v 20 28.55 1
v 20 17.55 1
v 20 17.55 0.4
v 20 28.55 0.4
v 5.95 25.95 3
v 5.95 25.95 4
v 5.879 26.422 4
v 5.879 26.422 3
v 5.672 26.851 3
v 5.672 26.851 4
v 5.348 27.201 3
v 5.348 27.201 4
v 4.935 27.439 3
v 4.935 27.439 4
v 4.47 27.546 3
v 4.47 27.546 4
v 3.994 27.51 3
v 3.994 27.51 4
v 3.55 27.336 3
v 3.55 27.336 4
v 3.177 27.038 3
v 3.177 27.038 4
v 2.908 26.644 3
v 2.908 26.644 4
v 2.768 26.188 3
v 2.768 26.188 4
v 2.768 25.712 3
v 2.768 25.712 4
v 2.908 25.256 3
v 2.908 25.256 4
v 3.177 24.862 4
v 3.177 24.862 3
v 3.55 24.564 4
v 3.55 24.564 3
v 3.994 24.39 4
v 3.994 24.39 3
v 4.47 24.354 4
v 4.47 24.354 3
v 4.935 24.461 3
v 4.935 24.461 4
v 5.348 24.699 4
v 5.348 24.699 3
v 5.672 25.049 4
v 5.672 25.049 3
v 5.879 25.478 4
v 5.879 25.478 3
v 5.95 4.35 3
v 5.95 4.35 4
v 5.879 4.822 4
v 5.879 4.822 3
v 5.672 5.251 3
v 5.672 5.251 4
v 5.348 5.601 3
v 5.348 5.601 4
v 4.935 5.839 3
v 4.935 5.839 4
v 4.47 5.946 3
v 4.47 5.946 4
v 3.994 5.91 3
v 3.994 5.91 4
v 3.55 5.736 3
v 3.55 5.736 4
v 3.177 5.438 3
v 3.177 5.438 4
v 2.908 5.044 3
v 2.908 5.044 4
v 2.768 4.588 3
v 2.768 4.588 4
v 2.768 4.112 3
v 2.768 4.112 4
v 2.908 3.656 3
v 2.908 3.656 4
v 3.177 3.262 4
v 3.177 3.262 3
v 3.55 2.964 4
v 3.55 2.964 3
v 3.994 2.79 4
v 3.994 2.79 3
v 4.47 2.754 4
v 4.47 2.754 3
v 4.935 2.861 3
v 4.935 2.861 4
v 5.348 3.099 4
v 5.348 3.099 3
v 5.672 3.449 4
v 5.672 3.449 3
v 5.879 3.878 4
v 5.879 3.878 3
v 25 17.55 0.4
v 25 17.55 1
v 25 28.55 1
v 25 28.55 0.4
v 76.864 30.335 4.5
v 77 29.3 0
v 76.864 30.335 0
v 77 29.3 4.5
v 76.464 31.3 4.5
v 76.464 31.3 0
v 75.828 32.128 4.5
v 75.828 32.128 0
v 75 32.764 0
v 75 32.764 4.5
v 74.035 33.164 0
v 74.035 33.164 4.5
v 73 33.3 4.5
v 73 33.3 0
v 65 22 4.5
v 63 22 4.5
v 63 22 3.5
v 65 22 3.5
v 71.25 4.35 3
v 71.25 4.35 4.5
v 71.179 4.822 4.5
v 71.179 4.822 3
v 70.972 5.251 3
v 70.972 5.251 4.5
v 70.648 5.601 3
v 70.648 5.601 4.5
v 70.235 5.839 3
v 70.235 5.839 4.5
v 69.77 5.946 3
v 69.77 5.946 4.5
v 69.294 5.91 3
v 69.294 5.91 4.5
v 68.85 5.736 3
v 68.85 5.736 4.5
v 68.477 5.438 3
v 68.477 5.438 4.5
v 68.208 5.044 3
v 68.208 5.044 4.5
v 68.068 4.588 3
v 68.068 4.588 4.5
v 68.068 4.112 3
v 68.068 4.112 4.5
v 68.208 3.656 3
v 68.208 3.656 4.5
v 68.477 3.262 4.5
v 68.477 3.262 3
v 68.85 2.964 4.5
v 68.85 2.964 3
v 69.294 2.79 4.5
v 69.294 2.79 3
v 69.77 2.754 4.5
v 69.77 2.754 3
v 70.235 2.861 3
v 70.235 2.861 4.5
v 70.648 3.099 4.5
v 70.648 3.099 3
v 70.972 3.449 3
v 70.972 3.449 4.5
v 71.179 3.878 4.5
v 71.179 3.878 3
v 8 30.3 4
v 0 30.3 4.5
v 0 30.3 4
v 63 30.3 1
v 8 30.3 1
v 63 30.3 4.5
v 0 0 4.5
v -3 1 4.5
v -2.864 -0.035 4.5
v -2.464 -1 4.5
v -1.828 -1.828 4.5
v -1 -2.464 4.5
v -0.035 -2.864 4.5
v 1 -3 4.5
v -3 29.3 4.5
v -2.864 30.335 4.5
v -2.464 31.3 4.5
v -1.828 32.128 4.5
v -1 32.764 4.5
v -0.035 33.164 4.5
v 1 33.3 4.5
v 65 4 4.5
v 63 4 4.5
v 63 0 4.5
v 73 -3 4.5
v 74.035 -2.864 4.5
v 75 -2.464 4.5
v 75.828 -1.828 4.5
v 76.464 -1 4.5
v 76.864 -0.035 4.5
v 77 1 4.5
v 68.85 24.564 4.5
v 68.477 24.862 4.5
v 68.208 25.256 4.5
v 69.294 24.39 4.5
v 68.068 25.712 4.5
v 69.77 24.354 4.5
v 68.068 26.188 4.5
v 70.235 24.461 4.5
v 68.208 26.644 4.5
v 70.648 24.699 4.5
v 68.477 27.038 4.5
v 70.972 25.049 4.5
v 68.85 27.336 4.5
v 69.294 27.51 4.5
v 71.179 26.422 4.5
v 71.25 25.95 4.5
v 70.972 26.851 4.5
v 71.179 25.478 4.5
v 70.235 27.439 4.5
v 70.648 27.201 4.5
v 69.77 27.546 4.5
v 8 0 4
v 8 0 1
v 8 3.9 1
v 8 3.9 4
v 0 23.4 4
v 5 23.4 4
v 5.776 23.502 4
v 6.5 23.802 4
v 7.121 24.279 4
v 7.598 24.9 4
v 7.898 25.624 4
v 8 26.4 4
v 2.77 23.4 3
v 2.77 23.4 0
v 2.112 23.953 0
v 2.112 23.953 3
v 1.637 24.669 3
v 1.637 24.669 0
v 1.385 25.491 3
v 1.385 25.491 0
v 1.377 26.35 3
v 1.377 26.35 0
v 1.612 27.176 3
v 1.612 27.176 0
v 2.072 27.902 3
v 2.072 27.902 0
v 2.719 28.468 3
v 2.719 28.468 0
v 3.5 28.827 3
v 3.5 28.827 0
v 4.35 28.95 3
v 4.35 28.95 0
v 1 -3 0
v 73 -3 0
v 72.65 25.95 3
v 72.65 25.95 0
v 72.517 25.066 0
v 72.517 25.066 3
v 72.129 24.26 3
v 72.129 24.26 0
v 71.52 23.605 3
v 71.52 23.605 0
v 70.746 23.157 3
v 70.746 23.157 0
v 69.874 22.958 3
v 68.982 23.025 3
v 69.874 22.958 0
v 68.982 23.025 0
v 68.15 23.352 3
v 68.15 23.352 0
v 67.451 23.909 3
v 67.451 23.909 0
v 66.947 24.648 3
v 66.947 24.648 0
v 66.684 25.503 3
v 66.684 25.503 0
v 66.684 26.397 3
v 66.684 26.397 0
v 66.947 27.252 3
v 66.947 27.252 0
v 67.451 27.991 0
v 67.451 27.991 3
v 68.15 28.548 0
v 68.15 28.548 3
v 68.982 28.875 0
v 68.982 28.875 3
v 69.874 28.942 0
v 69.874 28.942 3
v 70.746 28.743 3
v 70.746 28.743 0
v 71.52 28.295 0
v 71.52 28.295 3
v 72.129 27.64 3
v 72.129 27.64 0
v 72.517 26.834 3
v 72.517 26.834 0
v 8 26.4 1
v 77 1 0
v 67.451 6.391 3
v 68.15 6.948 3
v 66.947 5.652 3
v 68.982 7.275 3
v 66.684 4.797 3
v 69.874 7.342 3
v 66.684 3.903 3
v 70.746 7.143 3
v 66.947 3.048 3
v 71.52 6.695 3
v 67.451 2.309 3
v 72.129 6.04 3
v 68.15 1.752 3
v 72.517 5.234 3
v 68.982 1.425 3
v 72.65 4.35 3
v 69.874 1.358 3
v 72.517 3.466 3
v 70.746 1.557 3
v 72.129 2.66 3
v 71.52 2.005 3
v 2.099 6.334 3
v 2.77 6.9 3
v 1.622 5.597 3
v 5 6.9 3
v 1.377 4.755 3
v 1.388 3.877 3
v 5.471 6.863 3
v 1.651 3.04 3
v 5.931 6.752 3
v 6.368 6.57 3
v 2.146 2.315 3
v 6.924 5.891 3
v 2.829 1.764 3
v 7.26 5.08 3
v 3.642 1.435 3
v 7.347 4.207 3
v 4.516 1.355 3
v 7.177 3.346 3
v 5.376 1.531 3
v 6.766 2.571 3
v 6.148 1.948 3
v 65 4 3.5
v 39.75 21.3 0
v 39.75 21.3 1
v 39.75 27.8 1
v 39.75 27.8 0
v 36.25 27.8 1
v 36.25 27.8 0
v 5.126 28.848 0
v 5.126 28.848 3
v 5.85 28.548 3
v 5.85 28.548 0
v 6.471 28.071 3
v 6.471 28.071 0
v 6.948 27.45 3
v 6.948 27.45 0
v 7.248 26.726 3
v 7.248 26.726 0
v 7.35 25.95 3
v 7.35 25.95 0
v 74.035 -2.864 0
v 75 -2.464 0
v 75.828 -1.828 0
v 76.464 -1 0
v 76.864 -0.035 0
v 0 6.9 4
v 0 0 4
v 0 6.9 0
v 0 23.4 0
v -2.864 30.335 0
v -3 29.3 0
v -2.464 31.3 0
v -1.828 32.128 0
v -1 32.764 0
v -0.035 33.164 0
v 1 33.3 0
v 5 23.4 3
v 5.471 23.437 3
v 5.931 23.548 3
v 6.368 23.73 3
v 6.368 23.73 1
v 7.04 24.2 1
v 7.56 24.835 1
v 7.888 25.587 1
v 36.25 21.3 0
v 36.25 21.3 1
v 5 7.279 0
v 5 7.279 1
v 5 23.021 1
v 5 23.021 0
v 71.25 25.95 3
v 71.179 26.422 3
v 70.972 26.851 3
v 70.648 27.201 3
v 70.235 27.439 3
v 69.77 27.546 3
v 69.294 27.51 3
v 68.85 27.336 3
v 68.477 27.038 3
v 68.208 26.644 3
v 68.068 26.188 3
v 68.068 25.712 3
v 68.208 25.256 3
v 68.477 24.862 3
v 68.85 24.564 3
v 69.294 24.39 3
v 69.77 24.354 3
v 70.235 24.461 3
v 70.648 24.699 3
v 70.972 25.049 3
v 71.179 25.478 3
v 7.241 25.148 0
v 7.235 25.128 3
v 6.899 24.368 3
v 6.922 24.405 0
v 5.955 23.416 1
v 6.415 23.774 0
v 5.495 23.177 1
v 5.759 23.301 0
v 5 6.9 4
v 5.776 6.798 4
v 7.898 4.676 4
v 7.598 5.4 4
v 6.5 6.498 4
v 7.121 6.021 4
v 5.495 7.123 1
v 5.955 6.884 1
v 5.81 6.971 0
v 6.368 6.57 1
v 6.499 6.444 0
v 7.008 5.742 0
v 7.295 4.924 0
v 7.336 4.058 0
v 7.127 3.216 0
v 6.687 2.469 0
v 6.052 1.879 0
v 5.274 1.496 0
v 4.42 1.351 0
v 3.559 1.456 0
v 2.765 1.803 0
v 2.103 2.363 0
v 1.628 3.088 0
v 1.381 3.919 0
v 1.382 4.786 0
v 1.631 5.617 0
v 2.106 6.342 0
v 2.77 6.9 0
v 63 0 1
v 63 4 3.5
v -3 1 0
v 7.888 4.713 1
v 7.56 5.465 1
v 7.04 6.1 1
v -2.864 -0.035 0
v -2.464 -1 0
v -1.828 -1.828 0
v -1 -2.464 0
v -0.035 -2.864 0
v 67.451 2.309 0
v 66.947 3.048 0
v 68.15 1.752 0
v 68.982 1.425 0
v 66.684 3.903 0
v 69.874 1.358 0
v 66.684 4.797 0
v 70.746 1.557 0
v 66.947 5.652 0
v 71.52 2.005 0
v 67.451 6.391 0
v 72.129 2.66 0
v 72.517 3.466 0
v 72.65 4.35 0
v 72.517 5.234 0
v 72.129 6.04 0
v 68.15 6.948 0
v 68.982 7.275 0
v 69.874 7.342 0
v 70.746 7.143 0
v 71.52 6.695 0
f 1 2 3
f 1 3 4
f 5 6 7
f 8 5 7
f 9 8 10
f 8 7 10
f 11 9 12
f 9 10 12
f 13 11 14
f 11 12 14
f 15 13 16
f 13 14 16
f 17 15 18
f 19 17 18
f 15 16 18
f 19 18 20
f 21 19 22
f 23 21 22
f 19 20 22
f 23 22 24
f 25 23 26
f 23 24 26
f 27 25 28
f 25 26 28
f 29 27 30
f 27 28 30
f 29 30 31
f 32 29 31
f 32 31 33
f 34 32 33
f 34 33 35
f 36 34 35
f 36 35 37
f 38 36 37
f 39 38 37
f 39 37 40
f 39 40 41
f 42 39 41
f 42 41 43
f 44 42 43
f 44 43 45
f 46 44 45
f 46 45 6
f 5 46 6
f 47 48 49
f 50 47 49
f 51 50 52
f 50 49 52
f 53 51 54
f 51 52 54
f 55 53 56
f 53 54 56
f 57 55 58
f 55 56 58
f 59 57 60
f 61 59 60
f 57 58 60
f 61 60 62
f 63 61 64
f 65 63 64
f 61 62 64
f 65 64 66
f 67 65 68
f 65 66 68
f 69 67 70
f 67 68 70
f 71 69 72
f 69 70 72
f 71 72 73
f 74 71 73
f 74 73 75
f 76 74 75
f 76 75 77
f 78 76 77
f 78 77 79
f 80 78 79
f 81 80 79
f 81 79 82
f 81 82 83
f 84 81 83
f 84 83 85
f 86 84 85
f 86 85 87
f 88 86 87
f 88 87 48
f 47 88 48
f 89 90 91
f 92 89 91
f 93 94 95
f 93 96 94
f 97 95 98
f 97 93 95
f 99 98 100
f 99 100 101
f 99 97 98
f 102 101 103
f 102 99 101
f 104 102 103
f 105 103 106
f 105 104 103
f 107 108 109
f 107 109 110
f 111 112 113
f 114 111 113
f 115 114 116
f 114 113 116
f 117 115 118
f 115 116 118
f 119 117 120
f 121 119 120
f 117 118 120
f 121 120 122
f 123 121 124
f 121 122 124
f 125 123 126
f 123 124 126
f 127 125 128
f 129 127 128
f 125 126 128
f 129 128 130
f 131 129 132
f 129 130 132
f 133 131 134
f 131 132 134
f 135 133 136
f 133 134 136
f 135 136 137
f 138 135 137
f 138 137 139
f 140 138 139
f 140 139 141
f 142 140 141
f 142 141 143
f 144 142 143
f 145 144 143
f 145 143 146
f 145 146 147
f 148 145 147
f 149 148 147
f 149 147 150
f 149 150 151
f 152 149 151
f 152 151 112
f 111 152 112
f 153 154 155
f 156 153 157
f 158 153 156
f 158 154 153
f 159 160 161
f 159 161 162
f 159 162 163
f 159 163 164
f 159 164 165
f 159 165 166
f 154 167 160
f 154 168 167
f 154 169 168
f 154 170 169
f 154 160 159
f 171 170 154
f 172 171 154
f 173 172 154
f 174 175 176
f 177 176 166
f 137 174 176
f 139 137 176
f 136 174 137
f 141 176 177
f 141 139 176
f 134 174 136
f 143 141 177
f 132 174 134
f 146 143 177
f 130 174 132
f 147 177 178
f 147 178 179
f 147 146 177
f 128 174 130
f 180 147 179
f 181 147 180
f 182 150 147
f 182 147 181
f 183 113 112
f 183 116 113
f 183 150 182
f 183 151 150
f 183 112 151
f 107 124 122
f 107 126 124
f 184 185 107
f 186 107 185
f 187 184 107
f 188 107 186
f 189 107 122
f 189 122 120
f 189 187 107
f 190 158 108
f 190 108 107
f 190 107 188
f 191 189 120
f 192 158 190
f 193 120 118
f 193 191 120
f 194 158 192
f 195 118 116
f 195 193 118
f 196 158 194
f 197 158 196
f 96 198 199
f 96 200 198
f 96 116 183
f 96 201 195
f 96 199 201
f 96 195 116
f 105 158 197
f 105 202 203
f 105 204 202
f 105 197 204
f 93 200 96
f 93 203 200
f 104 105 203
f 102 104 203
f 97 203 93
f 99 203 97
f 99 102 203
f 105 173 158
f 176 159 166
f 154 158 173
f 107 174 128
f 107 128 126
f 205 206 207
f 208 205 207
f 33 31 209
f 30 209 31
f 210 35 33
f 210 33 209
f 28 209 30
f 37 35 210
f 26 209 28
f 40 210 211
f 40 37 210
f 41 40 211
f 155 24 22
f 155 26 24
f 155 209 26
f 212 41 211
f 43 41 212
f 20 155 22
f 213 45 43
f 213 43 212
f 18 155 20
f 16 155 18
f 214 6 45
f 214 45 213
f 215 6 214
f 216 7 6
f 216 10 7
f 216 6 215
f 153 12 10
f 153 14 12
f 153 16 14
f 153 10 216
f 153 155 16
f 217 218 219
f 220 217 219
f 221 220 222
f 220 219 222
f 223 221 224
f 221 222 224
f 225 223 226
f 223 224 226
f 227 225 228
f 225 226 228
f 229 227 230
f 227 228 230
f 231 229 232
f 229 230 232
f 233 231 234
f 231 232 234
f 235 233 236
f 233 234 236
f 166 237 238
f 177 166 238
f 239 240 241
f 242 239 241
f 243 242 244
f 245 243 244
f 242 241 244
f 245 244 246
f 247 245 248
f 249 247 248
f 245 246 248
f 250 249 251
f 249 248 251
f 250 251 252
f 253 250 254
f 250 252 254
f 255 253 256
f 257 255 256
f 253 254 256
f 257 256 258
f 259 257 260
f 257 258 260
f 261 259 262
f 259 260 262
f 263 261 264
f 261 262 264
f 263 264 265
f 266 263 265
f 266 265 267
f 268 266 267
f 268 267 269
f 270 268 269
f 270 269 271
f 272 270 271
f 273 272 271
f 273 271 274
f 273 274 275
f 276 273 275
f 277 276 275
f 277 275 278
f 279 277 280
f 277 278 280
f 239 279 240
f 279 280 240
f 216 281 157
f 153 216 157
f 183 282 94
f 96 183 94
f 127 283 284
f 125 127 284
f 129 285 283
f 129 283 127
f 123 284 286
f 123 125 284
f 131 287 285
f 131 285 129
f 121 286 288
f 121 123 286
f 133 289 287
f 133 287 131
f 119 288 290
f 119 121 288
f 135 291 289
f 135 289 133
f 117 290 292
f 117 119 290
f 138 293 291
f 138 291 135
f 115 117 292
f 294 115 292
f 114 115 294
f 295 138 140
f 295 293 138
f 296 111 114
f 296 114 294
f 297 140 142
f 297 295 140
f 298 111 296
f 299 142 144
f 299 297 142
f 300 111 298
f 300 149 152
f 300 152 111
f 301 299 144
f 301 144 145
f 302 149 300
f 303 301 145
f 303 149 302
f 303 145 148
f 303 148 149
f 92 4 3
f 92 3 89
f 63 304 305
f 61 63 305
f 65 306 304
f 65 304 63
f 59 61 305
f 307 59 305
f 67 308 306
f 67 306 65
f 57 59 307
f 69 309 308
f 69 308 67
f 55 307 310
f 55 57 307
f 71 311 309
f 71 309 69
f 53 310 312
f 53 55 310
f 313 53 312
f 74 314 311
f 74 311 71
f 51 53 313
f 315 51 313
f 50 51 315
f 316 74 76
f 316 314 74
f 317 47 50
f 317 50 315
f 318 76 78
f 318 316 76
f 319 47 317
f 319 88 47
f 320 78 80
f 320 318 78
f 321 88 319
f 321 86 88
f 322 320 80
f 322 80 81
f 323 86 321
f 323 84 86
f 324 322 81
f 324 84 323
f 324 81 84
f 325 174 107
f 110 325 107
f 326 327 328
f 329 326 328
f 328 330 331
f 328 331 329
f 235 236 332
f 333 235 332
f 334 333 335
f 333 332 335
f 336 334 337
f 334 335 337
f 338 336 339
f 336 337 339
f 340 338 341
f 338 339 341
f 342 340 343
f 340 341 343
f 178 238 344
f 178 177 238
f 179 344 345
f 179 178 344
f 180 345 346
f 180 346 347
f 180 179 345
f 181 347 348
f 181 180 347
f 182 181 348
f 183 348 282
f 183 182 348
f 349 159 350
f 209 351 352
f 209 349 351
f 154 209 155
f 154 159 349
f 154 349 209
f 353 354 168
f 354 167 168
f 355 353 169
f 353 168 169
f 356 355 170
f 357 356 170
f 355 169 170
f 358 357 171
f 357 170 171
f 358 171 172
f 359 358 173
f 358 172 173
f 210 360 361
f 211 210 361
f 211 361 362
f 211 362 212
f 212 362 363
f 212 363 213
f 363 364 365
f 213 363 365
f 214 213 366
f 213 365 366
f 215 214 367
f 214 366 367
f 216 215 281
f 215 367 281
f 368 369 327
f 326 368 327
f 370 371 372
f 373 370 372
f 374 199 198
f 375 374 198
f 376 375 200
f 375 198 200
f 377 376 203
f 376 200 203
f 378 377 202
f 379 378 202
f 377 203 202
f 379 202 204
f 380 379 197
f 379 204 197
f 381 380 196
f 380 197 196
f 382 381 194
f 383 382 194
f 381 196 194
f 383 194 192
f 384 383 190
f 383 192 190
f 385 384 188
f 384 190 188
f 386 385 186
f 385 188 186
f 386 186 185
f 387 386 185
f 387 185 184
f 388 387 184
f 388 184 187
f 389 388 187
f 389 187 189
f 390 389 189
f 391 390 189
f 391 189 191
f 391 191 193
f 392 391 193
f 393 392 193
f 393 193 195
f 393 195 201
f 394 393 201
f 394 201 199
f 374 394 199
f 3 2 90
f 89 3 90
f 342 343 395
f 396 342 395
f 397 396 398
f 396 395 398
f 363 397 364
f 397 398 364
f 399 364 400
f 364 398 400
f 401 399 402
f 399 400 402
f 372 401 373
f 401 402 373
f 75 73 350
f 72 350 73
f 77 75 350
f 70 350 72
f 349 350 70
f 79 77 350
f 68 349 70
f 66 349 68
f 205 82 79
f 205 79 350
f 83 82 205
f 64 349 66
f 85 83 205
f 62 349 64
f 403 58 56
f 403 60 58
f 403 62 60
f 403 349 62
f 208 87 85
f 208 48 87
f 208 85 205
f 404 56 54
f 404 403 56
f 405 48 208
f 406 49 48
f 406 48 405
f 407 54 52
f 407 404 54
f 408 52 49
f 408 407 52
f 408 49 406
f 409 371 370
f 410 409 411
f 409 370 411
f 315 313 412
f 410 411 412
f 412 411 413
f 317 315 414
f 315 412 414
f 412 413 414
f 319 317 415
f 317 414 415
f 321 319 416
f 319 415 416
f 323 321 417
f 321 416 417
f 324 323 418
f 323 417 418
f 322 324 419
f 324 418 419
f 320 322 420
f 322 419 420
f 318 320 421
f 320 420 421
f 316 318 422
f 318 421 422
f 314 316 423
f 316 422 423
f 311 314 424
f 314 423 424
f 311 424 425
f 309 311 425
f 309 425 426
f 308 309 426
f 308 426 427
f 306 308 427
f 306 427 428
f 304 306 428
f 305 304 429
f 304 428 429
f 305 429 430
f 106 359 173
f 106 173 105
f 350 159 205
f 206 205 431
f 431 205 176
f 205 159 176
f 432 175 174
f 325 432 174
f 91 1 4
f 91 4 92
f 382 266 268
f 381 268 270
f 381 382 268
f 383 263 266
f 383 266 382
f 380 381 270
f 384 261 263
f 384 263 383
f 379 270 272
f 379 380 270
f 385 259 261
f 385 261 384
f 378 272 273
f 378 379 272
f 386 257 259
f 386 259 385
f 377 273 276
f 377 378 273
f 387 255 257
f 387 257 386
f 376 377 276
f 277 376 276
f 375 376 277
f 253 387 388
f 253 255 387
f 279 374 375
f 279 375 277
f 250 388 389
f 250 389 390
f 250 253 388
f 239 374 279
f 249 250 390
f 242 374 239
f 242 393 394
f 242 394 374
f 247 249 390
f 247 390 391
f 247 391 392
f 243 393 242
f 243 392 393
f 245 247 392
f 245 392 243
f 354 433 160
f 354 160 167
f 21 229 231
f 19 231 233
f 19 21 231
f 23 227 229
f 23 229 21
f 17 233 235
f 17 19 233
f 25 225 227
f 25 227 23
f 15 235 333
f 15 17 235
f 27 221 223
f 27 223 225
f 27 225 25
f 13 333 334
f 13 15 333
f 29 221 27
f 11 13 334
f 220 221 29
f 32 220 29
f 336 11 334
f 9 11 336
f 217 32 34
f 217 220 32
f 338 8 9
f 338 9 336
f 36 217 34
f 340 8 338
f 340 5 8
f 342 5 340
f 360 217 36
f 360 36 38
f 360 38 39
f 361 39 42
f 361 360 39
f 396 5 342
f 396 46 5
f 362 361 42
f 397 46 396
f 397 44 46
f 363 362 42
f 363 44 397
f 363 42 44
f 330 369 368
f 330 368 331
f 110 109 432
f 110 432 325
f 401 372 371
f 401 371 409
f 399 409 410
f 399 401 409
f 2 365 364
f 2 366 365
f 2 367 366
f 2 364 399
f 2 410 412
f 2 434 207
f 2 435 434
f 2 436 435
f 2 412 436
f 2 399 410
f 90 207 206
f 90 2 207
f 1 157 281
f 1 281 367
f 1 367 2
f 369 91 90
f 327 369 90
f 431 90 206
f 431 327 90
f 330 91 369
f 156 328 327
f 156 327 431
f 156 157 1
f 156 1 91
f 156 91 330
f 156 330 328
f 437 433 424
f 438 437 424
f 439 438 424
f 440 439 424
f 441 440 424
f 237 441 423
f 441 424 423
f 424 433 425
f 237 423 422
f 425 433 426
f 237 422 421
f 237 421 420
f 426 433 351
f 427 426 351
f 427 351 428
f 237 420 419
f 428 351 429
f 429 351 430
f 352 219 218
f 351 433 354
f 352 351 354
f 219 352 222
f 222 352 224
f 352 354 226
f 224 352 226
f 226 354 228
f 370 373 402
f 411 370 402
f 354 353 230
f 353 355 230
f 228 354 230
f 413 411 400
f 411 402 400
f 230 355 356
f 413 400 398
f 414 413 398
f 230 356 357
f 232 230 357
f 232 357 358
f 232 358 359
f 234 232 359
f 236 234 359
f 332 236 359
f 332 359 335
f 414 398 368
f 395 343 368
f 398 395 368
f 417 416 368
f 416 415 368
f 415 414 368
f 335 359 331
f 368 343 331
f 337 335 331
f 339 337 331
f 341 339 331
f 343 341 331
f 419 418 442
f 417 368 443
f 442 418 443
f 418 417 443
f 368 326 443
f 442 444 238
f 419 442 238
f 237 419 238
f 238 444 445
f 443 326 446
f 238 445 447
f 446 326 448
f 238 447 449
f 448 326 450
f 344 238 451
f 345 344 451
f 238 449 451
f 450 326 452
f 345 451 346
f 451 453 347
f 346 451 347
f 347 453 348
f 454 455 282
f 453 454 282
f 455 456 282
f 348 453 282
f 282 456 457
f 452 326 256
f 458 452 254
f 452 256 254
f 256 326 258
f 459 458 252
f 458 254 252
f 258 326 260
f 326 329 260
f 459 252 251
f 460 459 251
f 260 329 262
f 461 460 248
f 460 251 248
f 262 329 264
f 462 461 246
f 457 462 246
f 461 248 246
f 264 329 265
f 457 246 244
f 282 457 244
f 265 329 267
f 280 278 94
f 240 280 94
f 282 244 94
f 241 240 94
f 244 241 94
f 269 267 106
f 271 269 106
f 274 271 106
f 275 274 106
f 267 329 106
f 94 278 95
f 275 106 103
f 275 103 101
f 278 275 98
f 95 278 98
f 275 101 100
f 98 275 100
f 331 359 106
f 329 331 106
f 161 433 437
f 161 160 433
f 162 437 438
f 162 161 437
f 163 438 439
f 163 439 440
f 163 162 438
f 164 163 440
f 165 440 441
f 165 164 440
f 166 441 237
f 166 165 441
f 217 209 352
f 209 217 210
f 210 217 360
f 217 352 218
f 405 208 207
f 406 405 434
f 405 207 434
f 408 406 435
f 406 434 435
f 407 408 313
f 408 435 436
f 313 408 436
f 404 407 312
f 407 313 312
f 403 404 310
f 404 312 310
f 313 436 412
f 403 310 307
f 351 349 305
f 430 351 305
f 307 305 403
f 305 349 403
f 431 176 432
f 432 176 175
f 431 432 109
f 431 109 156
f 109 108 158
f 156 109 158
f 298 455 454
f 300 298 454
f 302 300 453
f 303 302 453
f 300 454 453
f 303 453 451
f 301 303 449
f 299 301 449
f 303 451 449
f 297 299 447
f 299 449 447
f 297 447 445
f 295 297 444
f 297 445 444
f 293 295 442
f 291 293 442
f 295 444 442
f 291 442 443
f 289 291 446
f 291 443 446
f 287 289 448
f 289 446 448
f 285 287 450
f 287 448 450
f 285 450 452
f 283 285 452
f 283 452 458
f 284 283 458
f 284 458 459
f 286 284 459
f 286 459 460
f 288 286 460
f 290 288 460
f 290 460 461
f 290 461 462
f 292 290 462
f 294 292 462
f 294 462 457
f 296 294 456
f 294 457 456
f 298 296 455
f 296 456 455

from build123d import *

# Parameters (mm, degrees)
F0_W      = 80
F0_H      = 36.3
F1_DEPTH  = 4.5
F2_R      = 4
F3_W      = 63
F3_H      = 30.3
F4_DEPTH  = 3.5
F5_W      = 5
F5_H      = 16.5
F5_W_2    = 3.5
F5_H_2    = 6.5
F6_DEPTH  = 4.501
F7_W      = 2
F7_H      = 18
F8_DEPTH  = 1
F10_DEPTH = 3
F11_R     = 1.6
F12_DEPTH = 4.501
F13_R     = 3
F14_DEPTH = 3
F15_W     = 5
F15_H     = 11
F16_DEPTH = 0.6


with BuildPart() as f1:
    # F0 (on Top) → F1 (new body)
    with BuildSketch(Plane.XY):
        with Locations((37, 15.15)):
            Rectangle(F0_W, F0_H)
    extrude(amount=F1_DEPTH)

    # F2
    f2_edges = [f1.edges().sort_by_distance(p)[0] for p in [
        (-3, -3, 2.25),
        (77, -3, 2.25),
        (77, 33.3, 2.25),
        (-3, 33.3, 2.25),
    ]]
    fillet(f2_edges, radius=F2_R)

    # F3 (on face) → F4 (cut)
    with BuildSketch(Plane.XY.offset(4.5)):
        with Locations((31.5, 15.15)):
            Rectangle(F3_W, F3_H)
    extrude(amount=-F4_DEPTH, mode=Mode.SUBTRACT)

    # F5 (on face) → F6 (cut, through all)
    with BuildSketch(Plane.XY.offset(4.5)):
        with Locations((2.5, 15.15)):
            Rectangle(F5_W, F5_H)
        with Locations((38, 24.55)):
            Rectangle(F5_W_2, F5_H_2)
    extrude(amount=-F6_DEPTH, mode=Mode.SUBTRACT)

    # F7 (on face) → F8 (cut)
    with BuildSketch(Plane.XY.offset(4.5)):
        with Locations((64, 13)):
            Rectangle(F7_W, F7_H)
    extrude(amount=-F8_DEPTH, mode=Mode.SUBTRACT)

    # F9 (on face) → F10 (join)
    with BuildSketch(Plane.XY.offset(1)):
        with BuildLine():
            Line((8, 30.3), (0, 30.3))
            Line((0, 30.3), (0, 23.4))
            Line((0, 23.4), (5, 23.4))
            ThreePointArc((5, 23.4), (7.12132, 24.27868), (8, 26.4))
            Line((8, 26.4), (8, 30.3))
        make_face()
        with BuildLine():
            Line((5, 6.9), (0, 6.9))
            Line((0, 6.9), (0, 0))
            Line((0, 0), (8, 0))
            Line((8, 0), (8, 3.9))
            ThreePointArc((8, 3.9), (7.12132, 6.02132), (5, 6.9))
        make_face()
    extrude(amount=F10_DEPTH)

    # F11 (on face) → F12 (cut, through all)
    with BuildSketch(Plane.XY.offset(4.5)):
        with Locations((4.35, 4.35)):
            Circle(F11_R)
        with Locations((4.35, 25.95)):
            Circle(F11_R)
        with Locations((69.65, 25.95)):
            Circle(F11_R)
        with Locations((69.65, 4.35)):
            Circle(F11_R)
    extrude(amount=-F12_DEPTH, mode=Mode.SUBTRACT)

    # F13 (on face) → F14 (cut)
    with BuildSketch(Plane(origin=(0, 0, 0), x_dir=(1, 0, 0), z_dir=(0, 0, -1))):
        with Locations((69.65, -25.95)):
            Circle(F13_R)
        with Locations((69.65, -4.35)):
            Circle(F13_R)
        with BuildLine():
            ThreePointArc((4.35, -28.95), (6.47132, -28.07132), (7.35, -25.95))
            ThreePointArc((7.35, -25.95), (2.22868, -23.82868), (4.35, -28.95))
        make_face()
        with Locations((4.35, -4.35)):
            Circle(F13_R)
    extrude(amount=-F14_DEPTH, mode=Mode.SUBTRACT)

    # F15 (on face) → F16 (cut)
    with BuildSketch(Plane.XY.offset(1)):
        with Locations((22.5, 23.05)):
            Rectangle(F15_W, F15_H)
    extrude(amount=-F16_DEPTH, mode=Mode.SUBTRACT)


solid = f1.part
